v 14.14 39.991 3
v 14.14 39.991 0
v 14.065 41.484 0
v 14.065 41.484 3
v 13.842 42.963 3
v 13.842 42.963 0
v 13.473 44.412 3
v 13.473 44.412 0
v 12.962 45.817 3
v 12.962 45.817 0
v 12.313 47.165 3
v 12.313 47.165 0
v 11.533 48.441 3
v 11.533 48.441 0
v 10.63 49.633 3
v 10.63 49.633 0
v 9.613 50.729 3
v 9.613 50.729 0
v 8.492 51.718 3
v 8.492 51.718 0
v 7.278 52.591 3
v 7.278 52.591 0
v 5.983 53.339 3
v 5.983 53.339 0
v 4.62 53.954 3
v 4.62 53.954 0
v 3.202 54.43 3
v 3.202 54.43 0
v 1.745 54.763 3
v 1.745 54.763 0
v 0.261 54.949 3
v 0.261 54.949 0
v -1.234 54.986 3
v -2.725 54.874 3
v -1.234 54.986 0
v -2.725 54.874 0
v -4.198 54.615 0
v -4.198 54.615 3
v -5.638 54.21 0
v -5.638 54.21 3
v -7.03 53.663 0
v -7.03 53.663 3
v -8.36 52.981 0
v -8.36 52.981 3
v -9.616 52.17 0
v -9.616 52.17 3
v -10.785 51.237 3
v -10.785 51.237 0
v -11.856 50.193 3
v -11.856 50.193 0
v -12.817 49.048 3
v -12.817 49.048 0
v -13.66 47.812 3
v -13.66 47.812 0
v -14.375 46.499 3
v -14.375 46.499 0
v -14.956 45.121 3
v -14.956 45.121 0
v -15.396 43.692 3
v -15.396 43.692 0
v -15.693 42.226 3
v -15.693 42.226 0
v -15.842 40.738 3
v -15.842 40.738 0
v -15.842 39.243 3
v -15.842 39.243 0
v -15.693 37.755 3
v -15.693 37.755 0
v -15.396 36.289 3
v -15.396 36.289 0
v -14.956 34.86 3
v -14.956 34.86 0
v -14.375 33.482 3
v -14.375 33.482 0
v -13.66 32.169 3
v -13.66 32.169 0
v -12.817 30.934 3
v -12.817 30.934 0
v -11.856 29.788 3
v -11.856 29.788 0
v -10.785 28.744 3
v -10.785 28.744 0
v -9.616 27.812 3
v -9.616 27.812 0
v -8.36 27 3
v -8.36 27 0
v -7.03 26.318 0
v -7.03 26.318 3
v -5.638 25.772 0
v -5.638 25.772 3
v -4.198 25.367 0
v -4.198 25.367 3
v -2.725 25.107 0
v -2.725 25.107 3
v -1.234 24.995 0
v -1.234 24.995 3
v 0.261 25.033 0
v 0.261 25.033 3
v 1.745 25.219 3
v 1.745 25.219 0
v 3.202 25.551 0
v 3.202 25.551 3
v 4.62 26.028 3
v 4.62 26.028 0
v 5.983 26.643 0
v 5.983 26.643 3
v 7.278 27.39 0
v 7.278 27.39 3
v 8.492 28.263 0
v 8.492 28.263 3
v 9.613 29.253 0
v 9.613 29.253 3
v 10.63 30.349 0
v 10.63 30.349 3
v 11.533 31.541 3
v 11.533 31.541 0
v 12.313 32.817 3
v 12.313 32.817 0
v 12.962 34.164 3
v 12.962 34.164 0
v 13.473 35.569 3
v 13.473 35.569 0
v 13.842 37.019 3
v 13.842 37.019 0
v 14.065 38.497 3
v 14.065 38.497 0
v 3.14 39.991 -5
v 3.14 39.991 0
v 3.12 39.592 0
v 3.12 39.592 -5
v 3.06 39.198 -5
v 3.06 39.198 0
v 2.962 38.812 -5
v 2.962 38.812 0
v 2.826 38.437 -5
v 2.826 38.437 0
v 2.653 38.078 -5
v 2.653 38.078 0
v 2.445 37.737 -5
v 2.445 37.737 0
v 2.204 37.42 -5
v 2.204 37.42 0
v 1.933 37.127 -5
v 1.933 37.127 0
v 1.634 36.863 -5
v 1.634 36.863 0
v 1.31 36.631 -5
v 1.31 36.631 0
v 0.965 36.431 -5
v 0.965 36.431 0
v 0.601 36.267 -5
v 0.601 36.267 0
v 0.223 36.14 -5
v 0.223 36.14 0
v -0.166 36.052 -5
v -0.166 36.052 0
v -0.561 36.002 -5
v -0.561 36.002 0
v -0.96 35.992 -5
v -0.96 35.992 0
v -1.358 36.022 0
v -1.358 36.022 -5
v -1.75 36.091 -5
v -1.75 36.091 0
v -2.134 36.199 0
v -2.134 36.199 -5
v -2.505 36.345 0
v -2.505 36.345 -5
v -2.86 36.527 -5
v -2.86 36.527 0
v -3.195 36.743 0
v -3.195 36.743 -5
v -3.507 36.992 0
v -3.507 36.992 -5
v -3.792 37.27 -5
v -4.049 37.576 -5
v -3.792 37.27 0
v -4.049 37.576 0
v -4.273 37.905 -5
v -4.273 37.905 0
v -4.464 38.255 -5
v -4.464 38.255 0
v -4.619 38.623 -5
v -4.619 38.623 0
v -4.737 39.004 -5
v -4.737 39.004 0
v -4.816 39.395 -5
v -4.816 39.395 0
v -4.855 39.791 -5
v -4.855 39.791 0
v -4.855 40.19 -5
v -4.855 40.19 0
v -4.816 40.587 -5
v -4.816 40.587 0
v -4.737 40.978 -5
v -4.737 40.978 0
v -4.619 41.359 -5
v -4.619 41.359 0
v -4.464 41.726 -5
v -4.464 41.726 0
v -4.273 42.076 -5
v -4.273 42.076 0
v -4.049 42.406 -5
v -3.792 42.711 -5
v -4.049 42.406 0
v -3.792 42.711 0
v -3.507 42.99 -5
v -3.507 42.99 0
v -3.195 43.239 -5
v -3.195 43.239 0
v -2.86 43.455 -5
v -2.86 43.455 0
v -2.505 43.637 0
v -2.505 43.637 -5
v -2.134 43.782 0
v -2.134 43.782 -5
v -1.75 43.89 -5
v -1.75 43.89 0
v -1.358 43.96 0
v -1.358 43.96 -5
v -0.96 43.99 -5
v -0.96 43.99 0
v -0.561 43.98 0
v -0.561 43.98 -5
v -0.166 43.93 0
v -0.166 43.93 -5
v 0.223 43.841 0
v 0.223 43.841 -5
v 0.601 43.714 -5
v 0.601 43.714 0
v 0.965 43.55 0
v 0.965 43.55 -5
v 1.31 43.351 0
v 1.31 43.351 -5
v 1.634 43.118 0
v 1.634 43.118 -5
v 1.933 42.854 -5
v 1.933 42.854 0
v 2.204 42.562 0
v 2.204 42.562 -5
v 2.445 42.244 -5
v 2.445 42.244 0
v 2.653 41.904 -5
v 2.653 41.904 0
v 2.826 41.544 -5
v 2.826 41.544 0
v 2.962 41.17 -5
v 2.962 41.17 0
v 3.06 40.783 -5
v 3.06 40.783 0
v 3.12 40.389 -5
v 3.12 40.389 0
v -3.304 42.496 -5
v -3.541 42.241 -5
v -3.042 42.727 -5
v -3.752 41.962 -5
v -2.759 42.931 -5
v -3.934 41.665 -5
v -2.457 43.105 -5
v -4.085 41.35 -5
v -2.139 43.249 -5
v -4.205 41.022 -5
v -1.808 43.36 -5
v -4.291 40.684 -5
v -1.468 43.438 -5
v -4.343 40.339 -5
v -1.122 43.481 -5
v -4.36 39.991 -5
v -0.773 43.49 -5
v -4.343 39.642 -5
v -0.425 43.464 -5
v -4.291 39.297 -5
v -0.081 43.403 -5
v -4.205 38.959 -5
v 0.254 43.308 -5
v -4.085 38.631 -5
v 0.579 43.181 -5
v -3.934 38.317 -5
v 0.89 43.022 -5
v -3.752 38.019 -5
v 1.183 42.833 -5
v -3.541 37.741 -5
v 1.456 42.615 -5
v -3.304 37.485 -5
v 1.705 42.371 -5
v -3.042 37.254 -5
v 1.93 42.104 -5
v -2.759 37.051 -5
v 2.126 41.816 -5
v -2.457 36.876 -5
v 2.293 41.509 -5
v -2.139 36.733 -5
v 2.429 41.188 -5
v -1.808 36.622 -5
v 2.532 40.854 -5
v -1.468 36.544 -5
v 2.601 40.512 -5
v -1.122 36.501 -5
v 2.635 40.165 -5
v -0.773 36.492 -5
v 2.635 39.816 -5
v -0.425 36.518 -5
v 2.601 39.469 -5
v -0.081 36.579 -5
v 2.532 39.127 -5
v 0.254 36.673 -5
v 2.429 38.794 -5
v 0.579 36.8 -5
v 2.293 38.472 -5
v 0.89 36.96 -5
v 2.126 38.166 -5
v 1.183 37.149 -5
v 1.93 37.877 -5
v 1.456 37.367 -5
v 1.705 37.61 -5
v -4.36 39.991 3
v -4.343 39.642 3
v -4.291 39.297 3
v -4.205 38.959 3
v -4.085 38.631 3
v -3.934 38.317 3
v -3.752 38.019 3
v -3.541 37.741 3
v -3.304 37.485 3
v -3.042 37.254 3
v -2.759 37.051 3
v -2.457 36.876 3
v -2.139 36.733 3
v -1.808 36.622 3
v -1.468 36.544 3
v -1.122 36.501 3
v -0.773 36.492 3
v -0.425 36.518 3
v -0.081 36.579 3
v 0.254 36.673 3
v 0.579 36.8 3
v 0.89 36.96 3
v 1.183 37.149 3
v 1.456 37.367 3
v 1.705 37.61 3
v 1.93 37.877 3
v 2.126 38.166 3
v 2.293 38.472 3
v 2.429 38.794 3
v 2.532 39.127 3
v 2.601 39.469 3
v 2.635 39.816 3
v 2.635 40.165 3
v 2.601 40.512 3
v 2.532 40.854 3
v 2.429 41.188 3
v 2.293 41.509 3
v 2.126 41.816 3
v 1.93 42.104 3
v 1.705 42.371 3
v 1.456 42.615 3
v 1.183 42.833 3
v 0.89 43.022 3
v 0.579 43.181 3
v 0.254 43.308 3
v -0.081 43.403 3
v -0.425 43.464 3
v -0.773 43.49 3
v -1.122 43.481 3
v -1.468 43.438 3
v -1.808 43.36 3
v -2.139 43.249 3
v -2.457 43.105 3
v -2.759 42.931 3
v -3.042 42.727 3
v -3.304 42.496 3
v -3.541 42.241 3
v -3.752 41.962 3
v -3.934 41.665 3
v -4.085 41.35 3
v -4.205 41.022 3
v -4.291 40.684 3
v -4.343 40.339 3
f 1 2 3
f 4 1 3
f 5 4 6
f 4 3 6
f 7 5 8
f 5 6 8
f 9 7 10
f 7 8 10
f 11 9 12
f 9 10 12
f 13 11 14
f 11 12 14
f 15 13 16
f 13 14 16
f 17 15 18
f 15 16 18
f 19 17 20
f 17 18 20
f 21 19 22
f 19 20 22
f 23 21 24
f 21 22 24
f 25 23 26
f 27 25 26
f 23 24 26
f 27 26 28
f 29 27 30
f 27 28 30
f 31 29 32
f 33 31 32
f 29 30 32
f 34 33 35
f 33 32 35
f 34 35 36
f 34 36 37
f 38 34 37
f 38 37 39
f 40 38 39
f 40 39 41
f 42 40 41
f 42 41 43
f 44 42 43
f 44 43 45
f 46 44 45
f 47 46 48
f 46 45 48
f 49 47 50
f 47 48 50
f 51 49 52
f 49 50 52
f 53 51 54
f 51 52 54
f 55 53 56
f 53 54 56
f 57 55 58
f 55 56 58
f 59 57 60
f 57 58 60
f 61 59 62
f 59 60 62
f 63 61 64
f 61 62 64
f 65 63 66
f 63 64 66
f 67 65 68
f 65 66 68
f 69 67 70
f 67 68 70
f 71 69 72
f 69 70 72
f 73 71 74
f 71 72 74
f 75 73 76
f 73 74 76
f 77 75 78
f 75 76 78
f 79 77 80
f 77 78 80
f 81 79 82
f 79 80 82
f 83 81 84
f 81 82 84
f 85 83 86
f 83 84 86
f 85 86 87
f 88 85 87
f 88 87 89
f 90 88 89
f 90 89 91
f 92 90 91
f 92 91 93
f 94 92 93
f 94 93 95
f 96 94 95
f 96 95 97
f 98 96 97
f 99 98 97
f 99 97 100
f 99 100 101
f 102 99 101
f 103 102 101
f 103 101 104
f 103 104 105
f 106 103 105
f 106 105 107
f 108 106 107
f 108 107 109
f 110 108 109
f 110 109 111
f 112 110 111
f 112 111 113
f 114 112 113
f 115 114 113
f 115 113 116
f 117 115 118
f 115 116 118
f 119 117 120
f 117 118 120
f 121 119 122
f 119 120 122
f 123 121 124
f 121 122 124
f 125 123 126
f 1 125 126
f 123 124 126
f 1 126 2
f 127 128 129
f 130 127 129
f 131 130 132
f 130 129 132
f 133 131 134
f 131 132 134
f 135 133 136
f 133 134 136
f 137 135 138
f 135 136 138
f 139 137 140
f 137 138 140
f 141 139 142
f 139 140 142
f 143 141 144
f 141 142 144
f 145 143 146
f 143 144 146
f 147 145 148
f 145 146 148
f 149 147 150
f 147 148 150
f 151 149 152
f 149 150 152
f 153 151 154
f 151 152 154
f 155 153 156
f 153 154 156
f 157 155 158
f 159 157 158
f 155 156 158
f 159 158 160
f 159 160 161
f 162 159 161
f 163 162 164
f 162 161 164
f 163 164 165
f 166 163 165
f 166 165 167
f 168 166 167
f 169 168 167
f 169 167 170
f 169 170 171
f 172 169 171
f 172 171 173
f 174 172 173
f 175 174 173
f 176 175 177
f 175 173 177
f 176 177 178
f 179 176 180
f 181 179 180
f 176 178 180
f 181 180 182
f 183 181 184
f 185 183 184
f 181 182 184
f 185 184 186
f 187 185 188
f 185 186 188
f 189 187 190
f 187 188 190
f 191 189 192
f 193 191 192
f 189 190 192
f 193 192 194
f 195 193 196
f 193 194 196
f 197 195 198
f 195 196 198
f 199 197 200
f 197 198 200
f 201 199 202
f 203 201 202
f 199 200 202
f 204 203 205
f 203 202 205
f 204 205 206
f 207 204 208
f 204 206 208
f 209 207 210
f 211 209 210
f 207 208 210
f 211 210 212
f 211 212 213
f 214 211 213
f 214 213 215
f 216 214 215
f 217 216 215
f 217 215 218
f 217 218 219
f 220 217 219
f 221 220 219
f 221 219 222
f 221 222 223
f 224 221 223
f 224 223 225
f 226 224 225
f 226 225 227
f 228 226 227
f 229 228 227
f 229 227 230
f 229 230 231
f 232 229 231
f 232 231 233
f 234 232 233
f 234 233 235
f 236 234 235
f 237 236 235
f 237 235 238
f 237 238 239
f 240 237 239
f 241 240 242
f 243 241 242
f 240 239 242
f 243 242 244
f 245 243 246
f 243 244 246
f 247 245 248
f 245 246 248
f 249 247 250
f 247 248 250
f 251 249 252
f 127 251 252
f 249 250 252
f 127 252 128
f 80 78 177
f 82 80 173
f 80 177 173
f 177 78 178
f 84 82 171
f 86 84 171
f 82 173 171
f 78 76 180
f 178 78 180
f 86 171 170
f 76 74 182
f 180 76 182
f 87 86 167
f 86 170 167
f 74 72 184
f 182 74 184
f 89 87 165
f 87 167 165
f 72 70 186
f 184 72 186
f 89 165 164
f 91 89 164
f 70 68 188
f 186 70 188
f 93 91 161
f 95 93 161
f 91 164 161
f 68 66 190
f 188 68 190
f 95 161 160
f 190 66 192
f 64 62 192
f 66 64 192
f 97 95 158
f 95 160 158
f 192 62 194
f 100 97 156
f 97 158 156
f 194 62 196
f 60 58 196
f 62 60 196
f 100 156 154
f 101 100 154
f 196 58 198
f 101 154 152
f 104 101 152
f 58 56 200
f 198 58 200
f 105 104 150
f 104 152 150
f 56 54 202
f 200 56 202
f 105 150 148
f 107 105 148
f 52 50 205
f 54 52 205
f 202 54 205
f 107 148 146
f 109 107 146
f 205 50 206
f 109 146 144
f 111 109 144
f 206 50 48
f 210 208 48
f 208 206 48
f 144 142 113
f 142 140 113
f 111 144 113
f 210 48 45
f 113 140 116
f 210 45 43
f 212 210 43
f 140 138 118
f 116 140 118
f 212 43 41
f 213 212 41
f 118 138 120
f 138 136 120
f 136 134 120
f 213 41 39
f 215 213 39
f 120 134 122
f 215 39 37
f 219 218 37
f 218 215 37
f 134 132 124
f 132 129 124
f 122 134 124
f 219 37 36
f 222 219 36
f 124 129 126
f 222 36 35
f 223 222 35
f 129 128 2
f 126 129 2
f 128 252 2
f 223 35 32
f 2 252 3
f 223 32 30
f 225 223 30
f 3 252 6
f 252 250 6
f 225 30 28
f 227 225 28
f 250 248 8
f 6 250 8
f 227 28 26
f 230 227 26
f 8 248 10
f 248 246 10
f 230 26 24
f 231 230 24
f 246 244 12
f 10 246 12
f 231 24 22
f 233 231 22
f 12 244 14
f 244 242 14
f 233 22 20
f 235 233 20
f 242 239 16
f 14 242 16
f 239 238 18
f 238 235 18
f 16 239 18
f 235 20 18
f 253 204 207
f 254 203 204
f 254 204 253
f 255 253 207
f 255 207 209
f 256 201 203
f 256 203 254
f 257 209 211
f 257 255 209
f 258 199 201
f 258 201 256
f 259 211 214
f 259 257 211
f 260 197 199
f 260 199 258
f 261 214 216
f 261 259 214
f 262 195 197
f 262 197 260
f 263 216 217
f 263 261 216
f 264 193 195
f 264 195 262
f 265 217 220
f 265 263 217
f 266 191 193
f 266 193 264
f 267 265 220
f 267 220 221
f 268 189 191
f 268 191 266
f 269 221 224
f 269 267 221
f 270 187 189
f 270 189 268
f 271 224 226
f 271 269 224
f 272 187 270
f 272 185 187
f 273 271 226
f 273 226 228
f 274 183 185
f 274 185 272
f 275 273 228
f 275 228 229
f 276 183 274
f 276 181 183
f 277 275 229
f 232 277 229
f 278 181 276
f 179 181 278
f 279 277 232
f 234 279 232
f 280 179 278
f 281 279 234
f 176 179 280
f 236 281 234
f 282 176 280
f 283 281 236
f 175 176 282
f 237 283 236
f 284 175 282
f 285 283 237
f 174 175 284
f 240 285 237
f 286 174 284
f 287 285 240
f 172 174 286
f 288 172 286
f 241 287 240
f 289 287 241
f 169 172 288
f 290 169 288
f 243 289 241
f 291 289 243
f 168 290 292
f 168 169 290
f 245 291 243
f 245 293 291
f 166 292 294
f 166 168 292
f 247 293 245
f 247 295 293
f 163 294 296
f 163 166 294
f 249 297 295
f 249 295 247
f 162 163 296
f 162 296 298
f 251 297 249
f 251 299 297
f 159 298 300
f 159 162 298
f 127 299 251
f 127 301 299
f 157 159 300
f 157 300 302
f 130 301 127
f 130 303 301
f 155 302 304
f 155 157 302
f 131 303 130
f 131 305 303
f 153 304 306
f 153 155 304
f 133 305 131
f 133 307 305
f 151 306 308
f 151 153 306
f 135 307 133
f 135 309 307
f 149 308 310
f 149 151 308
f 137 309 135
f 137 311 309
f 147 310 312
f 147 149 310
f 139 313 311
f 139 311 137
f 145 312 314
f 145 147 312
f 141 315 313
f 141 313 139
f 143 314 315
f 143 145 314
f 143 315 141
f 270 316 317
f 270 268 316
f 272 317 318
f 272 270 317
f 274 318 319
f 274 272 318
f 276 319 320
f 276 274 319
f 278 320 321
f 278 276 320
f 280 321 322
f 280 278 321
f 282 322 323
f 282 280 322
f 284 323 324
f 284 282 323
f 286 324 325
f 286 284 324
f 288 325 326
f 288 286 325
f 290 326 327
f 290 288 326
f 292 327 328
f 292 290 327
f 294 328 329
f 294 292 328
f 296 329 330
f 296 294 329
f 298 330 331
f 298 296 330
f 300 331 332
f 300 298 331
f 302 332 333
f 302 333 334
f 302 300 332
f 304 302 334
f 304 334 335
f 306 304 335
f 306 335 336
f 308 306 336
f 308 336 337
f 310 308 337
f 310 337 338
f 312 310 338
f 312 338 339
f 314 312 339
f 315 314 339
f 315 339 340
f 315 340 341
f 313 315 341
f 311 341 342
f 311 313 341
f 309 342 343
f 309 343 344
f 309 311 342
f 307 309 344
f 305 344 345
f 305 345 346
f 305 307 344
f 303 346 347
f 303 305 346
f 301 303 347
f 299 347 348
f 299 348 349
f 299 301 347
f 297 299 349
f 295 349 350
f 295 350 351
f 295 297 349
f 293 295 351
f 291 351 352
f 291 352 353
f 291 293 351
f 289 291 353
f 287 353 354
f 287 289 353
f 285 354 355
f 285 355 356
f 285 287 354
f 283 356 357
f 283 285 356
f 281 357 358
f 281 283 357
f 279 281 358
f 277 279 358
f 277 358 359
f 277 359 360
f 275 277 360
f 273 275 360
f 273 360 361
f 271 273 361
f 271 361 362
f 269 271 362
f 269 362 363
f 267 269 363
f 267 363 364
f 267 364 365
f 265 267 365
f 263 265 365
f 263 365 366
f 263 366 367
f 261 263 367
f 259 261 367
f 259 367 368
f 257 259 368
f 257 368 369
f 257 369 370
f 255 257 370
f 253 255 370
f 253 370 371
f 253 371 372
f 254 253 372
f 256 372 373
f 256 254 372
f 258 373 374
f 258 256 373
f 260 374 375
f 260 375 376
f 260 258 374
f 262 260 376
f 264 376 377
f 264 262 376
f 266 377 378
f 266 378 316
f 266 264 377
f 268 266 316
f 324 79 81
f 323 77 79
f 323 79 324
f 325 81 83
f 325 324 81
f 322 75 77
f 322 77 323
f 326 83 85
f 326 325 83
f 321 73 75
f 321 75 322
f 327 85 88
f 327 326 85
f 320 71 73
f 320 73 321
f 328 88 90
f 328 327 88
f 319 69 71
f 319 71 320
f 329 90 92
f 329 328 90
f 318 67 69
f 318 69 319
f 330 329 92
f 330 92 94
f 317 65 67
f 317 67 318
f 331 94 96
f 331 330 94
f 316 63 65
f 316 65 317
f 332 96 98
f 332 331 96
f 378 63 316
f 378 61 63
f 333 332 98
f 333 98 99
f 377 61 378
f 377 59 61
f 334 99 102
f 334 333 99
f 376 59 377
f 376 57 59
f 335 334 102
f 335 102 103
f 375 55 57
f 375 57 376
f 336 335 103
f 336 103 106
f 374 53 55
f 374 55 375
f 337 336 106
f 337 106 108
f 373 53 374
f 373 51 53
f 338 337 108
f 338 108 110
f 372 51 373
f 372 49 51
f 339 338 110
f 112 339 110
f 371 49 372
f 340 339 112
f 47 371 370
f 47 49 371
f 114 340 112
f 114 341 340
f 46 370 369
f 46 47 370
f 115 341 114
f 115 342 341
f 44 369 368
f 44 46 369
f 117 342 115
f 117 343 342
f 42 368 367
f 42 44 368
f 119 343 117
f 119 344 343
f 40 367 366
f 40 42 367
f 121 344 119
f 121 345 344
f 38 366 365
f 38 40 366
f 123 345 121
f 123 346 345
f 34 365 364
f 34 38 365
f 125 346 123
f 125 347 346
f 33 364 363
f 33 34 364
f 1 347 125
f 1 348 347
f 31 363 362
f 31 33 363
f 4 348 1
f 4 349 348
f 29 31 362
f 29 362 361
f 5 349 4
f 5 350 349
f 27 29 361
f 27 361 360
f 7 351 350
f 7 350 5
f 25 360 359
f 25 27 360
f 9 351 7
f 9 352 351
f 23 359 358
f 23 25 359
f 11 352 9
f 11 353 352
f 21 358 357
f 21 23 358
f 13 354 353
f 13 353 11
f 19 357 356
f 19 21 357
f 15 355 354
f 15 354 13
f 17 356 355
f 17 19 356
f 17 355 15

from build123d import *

# Parameters (mm, degrees)
SKETCH1_R           = 15
SKETCH1_R_2         = 4
BOSS_EXTRUDE1_DEPTH = 3
SKETCH2_R           = 4
SKETCH2_R_2         = 3.5
BOSS_EXTRUDE2_DEPTH = 5
SKETCH4_R           = 4
SKETCH4_R_2         = 3.5
BOSS_EXTRUDE4_DEPTH = 3


with BuildPart() as part:
    # Sketch1 → Boss-Extrude1 (new body)
    with BuildSketch(Plane.XY):
        with Locations((-0.860205172, 39.990749519)):
            Circle(SKETCH1_R)
        with Locations((-0.860205172, 39.990749519)):
            Circle(SKETCH1_R_2, mode=Mode.SUBTRACT)
    extrude(amount=BOSS_EXTRUDE1_DEPTH)



with BuildPart() as body_2:
    # Sketch2 → Boss-Extrude2 (new body)
    with BuildSketch(Plane(origin=(0, 0, 0), x_dir=(-1, 0, 0), z_dir=(0, 0, -1))):
        with Locations(Location((0.860205172, 39.990749519, 0), (0, 0, 180))):
            Circle(SKETCH2_R)
        with Locations((0.860205172, 39.990749519)):
            Circle(SKETCH2_R_2, mode=Mode.SUBTRACT)
    extrude(amount=BOSS_EXTRUDE2_DEPTH)


with BuildPart() as part_1:
    add(part.part)

    add(body_2.part)  # Boss-Extrude4 merges body 2
    # Sketch4 → Boss-Extrude4 (add)
    with BuildSketch(Plane.XY):
        with Locations((-0.860205172, 39.990749519)):
            Circle(SKETCH4_R)
        with Locations(Location((-0.860205172, 39.990749519, 0), (0, 0, 180))):
            Circle(SKETCH4_R_2, mode=Mode.SUBTRACT)
    extrude(amount=BOSS_EXTRUDE4_DEPTH)


solid = part_1.part
